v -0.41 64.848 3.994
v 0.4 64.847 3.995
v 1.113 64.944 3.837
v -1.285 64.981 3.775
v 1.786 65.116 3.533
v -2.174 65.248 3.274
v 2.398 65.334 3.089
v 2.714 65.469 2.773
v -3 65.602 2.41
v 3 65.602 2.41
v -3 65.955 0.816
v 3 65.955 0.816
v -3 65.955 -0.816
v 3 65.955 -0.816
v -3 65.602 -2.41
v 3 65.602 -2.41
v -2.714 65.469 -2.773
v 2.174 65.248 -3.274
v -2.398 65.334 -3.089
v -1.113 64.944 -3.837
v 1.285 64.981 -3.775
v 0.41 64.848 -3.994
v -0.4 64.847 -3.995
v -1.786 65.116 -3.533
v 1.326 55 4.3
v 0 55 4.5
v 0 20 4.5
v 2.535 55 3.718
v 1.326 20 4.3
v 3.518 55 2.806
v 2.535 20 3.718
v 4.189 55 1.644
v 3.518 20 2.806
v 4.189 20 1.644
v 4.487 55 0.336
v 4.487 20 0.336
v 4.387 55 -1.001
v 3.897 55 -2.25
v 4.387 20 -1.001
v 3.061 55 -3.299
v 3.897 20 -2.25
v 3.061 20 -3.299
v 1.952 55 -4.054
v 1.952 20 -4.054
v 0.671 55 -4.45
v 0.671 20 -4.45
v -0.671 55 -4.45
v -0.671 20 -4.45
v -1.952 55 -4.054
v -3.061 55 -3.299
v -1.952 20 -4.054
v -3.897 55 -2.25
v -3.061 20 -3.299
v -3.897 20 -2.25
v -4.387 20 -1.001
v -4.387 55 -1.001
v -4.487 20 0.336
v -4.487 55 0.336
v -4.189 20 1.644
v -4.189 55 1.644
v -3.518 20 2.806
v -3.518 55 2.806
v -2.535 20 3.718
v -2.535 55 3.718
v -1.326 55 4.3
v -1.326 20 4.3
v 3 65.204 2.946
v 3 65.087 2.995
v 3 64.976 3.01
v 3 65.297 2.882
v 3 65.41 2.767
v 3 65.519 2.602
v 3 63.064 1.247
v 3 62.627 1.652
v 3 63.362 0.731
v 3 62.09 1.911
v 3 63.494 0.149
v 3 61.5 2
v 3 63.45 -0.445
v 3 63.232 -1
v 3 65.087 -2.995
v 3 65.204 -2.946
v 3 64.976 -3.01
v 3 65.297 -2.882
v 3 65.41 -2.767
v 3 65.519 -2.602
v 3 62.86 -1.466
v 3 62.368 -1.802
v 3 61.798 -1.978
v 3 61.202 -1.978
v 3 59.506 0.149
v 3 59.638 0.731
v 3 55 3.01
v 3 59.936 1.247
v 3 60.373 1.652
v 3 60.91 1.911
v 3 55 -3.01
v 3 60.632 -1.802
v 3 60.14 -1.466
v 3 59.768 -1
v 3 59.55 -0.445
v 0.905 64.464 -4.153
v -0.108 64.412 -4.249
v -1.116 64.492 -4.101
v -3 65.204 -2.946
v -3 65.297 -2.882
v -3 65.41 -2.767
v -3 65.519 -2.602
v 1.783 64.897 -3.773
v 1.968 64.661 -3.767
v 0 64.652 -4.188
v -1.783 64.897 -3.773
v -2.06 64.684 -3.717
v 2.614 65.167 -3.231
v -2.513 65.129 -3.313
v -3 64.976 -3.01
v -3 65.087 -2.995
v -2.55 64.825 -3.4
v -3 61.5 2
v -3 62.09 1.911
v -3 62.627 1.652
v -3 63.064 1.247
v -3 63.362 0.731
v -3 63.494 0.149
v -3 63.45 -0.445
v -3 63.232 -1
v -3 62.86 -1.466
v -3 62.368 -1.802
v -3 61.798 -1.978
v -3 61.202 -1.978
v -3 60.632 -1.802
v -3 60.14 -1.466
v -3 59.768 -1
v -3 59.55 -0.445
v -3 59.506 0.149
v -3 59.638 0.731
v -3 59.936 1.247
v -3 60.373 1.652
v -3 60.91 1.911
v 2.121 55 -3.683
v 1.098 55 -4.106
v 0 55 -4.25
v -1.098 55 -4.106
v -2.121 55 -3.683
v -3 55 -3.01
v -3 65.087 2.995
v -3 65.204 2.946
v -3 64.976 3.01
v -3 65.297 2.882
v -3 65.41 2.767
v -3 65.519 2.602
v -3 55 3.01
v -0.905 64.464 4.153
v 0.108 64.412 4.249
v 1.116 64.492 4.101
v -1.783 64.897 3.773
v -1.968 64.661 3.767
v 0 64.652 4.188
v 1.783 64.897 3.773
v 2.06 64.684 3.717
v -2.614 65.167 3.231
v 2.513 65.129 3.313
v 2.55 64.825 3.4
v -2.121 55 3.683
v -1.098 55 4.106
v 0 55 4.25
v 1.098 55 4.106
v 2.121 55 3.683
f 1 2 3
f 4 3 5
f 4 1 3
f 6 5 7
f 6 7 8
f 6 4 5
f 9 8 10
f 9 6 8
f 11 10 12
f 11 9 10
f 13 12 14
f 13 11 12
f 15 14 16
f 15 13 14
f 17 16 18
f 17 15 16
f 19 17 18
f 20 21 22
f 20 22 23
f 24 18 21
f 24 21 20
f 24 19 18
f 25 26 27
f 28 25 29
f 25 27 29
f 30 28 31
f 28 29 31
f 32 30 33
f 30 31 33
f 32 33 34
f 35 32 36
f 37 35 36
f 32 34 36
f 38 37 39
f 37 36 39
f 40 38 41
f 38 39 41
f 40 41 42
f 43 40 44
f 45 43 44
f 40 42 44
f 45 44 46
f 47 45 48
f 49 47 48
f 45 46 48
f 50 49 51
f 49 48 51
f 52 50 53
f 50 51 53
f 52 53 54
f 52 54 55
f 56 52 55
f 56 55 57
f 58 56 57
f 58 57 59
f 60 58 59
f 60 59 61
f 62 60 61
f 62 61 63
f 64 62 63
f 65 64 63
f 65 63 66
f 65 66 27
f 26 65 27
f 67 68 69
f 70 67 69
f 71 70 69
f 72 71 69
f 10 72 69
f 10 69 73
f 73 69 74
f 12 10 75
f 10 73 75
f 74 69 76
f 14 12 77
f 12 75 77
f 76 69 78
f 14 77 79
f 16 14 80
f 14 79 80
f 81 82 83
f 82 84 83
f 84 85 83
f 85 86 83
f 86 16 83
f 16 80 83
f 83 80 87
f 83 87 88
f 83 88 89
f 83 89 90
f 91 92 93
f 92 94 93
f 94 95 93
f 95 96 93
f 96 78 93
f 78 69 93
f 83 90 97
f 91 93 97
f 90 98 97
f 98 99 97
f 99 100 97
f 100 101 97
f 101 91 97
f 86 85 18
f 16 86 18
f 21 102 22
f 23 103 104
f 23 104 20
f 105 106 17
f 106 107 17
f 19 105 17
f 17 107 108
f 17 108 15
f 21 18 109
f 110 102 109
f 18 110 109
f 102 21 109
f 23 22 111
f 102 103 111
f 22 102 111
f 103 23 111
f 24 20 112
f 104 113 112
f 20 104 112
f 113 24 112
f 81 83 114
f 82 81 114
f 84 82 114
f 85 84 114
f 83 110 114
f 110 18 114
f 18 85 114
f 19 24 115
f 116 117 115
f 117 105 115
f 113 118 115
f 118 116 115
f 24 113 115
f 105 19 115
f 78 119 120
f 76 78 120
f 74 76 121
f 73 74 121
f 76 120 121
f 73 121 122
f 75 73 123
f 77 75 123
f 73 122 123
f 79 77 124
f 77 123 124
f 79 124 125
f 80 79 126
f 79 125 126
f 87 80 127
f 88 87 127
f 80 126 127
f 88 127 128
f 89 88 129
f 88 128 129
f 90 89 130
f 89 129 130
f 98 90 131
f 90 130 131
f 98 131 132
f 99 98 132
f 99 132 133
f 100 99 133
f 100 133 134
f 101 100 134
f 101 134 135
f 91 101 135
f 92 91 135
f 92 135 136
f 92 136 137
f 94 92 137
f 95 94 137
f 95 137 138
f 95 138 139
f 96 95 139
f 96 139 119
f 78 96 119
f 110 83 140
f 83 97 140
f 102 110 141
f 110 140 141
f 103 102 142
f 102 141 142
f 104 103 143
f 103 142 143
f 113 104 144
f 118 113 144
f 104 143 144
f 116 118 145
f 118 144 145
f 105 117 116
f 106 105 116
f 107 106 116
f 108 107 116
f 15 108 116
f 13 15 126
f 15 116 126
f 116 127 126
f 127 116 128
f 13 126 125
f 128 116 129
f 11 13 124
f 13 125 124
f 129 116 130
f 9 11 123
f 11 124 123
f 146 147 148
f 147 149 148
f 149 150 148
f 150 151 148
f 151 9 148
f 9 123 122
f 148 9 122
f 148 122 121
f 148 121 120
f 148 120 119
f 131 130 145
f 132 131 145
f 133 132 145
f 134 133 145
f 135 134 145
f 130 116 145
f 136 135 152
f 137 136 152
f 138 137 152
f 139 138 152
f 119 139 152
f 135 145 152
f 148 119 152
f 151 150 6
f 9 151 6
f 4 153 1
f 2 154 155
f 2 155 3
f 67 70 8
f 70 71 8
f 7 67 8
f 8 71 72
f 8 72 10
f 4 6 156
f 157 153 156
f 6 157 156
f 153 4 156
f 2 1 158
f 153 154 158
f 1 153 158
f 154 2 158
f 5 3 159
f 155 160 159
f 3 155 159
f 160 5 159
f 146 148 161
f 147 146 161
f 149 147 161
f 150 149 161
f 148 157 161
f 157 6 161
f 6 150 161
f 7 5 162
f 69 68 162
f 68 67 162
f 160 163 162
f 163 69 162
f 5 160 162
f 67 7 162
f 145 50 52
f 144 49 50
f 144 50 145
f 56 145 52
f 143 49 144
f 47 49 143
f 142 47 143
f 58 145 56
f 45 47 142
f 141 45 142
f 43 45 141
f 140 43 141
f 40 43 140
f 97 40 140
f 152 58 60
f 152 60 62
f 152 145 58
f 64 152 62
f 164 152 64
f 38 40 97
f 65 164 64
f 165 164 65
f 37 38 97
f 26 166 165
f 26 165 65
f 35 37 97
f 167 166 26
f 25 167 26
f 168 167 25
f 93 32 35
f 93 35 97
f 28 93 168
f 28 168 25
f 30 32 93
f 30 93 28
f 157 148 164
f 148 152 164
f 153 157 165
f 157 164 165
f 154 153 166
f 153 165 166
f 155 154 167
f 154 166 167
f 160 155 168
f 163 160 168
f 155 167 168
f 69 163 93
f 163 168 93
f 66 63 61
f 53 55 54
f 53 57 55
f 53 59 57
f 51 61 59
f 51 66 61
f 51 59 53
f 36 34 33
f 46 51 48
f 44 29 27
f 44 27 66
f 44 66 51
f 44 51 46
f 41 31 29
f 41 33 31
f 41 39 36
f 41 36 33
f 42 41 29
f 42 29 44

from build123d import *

# Parameters (mm, degrees)
SKETCH_1_R          = 4.5
EXTRUDE_1_DEPTH     = 55
EXTRUDE_2_DEPTH     = 15
SKETCH_4_R          = 2
CUT_EXTRUDE_1_DEPTH = 71.544312315
CUT_EXTRUDE_3_DEPTH = 71.544312315
FILLET_1_R          = 0.5
SKETCH1_R           = 4.5
CUT_EXTRUDE1_DEPTH  = 20


with BuildPart() as part:
    # 草图1 → 凸台-拉伸1 (new body)
    with BuildSketch(Plane(origin=(0, 0, 0), x_dir=(1, 0, 0), z_dir=(0, 1, 0))):
        with Locations(Location((0, 0, 0), (0, 0, 270))):
            Circle(SKETCH_1_R)
    extrude(amount=EXTRUDE_1_DEPTH)

    # 草图2 → 凸台-拉伸2 (add)
    with BuildSketch(Plane(origin=(0, 55, 0), x_dir=(1, 0, 0), z_dir=(0, 1, 0))):
        with BuildLine():
            Line((-3, 3.010398645), (-3, -3.010398645))
            ThreePointArc((-3, -3.010398645), (0, -4.25), (3, -3.010398645))
            Line((3, -3.010398645), (3, 3.010398645))
            ThreePointArc((3, 3.010398645), (0, 4.25), (-3, 3.010398645))
        make_face()
    extrude(amount=EXTRUDE_2_DEPTH)

    # 草图4 → 切除-拉伸1 (cut, through all)
    with BuildSketch(Plane.ZY.offset(3)):
        with Locations((0, 61.5)):
            Circle(SKETCH_4_R)
    extrude(amount=-CUT_EXTRUDE_1_DEPTH, mode=Mode.SUBTRACT)

    # 草图5 → 切除-拉伸3 (cut, through all)
    with BuildSketch(Plane.ZY.offset(3)):
        with BuildLine():
            Line((-4.813255022, 64.251745482), (-4.813255022, 72.406434262))
            Line((-4.813255022, 72.406434262), (5.466876832, 72.406434262))
            Line((5.466876832, 72.406434262), (5.466876832, 63.634516306))
            ThreePointArc((5.466876832, 63.634516306), (0.449497866, 65.986517994), (-4.813255022, 64.251745482))
        make_face()
    extrude(amount=-CUT_EXTRUDE_3_DEPTH, mode=Mode.SUBTRACT)

    # 圆角1
    fillet_1_edges = [part.edges().sort_by_distance(p)[0] for p in [
        (0, 64.679603547, -4.25),
        (0, 64.679603547, 4.25),
    ]]
    fillet(fillet_1_edges, radius=FILLET_1_R)

    # Sketch1 → Cut-Extrude1 (cut)
    with BuildSketch(Plane.XZ):
        with Locations(Location((0, 0, 0), (0, 0, 270))):
            Circle(SKETCH1_R)
    extrude(amount=-CUT_EXTRUDE1_DEPTH, mode=Mode.SUBTRACT)


solid = part.part
